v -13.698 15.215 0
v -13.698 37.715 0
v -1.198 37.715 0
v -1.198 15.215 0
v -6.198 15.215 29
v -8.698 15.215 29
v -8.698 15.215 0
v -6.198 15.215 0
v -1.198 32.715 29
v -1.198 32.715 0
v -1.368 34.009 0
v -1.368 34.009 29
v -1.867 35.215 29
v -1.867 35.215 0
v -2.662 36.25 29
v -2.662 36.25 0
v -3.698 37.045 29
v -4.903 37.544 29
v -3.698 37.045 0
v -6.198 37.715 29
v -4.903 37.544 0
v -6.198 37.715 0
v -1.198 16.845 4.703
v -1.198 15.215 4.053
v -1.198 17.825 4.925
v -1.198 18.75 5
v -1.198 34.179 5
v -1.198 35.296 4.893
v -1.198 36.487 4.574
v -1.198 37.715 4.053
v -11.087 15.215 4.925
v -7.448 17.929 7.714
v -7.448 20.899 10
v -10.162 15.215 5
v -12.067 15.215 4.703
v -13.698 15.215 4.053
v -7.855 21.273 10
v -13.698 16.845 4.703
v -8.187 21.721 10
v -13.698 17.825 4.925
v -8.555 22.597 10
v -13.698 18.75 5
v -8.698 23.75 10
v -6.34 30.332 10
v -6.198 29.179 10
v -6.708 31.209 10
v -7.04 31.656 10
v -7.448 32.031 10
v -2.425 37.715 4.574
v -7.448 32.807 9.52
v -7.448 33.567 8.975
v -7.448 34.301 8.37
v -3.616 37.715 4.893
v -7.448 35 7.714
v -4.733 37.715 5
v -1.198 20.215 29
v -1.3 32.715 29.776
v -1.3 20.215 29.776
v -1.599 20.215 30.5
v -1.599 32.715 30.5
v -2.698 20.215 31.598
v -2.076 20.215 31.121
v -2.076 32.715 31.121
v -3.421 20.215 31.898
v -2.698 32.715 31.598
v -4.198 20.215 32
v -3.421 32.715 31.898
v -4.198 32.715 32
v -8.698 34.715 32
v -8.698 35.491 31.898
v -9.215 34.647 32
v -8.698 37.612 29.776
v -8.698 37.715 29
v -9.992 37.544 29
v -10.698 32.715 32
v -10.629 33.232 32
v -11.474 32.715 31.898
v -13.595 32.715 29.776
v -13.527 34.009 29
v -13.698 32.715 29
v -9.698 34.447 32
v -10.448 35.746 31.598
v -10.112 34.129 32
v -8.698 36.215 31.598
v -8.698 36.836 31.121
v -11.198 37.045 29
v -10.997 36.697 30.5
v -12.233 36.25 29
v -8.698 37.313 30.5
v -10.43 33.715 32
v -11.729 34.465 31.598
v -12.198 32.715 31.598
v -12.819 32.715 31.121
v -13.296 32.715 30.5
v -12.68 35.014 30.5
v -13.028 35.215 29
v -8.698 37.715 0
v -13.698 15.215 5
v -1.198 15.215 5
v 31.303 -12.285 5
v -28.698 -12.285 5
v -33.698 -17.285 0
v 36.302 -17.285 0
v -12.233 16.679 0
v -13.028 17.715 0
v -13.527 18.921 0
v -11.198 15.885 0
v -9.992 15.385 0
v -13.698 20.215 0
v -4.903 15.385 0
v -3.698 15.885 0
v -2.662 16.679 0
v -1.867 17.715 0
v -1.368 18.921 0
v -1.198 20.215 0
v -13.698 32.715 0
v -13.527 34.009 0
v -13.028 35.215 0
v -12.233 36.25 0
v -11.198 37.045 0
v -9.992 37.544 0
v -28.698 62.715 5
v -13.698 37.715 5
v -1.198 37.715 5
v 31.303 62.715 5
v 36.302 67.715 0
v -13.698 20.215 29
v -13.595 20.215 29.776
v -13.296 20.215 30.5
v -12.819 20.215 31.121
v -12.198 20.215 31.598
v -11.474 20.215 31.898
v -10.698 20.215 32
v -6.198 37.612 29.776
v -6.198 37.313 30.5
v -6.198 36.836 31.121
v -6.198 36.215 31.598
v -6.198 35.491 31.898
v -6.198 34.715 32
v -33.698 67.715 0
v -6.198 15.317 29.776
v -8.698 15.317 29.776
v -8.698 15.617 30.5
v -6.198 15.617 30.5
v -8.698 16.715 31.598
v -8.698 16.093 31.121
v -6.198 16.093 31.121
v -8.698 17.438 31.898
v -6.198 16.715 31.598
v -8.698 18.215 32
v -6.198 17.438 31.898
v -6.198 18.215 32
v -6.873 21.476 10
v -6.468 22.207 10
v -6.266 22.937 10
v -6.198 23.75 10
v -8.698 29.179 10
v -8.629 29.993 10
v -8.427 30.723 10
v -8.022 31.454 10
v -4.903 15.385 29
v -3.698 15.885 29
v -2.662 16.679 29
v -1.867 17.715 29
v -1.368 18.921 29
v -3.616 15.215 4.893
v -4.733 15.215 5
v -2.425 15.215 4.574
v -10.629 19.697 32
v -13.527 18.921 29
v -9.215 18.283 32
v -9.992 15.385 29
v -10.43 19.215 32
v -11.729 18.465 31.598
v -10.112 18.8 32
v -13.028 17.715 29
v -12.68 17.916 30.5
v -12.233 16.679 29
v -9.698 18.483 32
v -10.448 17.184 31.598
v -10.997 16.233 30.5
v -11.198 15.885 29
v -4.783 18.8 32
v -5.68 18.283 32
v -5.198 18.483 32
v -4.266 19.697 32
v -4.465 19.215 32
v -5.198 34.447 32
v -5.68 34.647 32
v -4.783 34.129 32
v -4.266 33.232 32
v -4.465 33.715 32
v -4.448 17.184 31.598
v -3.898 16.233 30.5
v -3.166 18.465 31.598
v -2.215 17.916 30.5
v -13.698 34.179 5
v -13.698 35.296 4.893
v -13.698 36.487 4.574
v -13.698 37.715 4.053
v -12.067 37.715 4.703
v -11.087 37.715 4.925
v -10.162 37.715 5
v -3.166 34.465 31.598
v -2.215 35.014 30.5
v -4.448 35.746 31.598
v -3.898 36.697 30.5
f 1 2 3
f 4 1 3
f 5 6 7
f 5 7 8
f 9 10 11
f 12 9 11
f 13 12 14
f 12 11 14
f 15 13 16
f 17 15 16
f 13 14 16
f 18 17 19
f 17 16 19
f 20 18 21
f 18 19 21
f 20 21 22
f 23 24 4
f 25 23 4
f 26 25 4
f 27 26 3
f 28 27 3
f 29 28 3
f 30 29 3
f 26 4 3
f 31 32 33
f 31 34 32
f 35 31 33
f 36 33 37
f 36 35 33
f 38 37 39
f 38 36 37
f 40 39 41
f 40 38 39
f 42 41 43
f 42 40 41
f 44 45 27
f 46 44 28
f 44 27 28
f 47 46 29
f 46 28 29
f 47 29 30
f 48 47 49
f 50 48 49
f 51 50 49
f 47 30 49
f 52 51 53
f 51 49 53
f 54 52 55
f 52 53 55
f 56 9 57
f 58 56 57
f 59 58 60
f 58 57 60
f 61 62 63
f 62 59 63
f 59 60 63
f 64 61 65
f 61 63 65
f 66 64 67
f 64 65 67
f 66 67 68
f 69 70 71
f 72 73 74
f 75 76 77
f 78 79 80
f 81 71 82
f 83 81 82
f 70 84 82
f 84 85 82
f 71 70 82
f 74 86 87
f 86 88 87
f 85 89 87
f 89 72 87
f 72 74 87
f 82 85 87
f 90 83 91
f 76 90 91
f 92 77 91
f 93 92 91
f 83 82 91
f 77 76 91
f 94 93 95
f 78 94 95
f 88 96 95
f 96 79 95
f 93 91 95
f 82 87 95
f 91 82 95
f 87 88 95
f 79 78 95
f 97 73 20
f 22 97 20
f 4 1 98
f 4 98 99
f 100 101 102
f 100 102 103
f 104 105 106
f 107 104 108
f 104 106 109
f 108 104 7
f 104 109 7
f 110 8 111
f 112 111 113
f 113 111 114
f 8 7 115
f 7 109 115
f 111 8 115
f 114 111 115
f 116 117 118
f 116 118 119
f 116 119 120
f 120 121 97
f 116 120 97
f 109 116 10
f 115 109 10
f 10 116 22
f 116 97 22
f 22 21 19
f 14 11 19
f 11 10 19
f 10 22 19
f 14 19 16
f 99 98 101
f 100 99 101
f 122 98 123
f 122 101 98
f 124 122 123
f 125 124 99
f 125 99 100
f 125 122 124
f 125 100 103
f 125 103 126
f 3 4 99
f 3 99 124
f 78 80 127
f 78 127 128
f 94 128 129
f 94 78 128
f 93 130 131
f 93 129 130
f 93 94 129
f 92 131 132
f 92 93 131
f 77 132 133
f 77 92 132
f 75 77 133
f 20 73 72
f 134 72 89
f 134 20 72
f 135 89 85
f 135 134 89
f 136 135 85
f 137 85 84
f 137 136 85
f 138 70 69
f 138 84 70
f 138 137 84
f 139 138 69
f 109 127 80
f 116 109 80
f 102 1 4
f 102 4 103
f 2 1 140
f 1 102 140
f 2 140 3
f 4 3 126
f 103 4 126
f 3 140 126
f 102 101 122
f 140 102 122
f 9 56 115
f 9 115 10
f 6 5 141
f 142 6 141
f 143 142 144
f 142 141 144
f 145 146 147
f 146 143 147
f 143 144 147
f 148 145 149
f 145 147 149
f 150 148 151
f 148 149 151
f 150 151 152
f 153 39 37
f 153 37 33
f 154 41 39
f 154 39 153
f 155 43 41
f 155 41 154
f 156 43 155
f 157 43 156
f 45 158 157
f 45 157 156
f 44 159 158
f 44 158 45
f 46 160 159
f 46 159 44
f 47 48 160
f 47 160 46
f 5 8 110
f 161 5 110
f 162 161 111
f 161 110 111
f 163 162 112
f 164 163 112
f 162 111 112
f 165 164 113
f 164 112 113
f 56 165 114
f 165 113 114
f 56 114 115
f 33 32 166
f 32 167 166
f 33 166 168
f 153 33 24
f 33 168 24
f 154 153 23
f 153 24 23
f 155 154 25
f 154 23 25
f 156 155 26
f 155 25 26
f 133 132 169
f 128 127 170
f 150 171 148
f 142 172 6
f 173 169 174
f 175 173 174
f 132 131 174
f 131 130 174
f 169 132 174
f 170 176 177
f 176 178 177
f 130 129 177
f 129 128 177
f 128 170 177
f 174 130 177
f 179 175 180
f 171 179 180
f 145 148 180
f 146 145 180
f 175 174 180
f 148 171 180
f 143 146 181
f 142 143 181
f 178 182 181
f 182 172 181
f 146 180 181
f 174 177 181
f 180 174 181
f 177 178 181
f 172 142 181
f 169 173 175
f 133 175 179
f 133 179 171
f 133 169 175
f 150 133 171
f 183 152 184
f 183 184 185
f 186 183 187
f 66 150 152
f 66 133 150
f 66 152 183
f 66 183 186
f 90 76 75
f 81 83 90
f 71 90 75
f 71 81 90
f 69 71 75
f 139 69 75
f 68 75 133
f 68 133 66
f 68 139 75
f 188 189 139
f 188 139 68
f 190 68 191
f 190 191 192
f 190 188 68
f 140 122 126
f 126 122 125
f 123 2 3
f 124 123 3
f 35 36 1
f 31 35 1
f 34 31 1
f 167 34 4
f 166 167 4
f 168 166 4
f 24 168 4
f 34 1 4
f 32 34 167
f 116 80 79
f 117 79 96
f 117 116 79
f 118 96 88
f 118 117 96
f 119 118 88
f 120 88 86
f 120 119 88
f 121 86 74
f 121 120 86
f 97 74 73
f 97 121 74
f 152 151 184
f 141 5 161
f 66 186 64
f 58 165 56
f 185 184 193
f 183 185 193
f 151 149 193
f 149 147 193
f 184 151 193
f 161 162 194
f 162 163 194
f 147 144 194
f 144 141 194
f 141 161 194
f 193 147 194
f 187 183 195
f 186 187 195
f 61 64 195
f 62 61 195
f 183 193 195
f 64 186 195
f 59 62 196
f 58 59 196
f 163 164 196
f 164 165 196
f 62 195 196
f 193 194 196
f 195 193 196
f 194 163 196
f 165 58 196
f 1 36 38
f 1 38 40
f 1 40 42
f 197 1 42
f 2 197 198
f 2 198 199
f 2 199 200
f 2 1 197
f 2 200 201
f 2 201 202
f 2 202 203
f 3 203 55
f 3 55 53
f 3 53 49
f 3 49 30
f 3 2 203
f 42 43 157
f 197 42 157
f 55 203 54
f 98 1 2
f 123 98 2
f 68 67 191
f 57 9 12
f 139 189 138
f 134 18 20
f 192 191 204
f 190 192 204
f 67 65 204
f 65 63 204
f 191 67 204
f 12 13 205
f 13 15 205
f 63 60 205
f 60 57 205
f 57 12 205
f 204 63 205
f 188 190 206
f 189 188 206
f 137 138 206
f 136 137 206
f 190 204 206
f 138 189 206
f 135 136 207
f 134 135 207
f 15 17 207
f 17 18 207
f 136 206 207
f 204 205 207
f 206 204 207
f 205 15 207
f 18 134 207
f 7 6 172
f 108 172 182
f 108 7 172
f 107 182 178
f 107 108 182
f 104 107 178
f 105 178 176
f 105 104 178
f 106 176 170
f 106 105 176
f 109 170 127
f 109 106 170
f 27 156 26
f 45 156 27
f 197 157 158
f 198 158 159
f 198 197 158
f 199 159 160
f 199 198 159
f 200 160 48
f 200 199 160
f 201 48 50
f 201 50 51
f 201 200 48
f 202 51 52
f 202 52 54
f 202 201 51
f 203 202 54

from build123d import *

# Parameters (mm, degrees)
F0_W         = 70
F0_H         = 85
F0_W_2       = 12.5
F0_H_2       = 22.5
F1_DEPTH     = 5
F2_SIZE      = 4.99999
F3_DEPTH     = 32
F4_R         = 3
F5_T1_DEPTH  = 44.5
F5_T4_ANGLE  = 90
F5_T6_ANGLE  = 90
F5_T8_ANGLE  = 90
F5_T10_ANGLE = 90
F6_DEPTH     = 10
F7_SIZE      = 5
F8_T1_DEPTH  = 23.0940107676
F8_T3_DEPTH  = 23.0940107676
F8_T5_DEPTH  = 23.0940107676
F8_T7_DEPTH  = 23.0940107676


# Not quite as in the source:
# - a fillet or chamfer that OpenCascade refuses, or shapes differently, is made with other operations: its cross-section is extruded or revolved along the edge and cut away or added
# - a fillet or chamfer is up to 0.001 mm smaller than in the source, because OpenCascade refuses the exact size


with BuildPart() as f1:
    # F0 (on Top) → F1 (new body)
    with BuildSketch(Plane.XY):
        with Locations((1.3024921715, 25.2146533675)):
            Rectangle(F0_W, F0_H)
        with Locations((-7.4475078285, 26.4646533675)):
            Rectangle(F0_W_2, F0_H_2, mode=Mode.SUBTRACT)
    extrude(amount=F1_DEPTH)

    # F2 (size 5 in the source; OpenCascade refuses exactly that, so slightly less here)
    f2_edges = [f1.edges().sort_by_distance(p)[0] for p in [
        (-33.697508, 25.214653, 5),
        (1.302492, -17.285347, 5),
        (36.302492, 25.214653, 5),
        (1.302492, 67.714653, 5),
    ]]
    chamfer(f2_edges, length=F2_SIZE)


with BuildPart() as f3:
    # F0 (on Top) → F3 (new body)
    with BuildSketch(Plane.XY):
        with Locations((-7.4475078285, 26.4646533675)):
            Rectangle(F0_W_2, F0_H_2)
    extrude(amount=F3_DEPTH)

    # F4
    f4_edges = [f3.edges().sort_by_distance(p)[0] for p in [
        (-13.697508, 26.464653, 32),
        (-7.447508, 15.214653, 32),
        (-7.447508, 37.714653, 32),
        (-1.197508, 26.464653, 32),
    ]]
    fillet(f4_edges, radius=F4_R)

    # F5: fillet of radius 5 on 8 edges, made by hand

    # F5_s2 → F5_t1 (cut)
    with BuildSketch(Plane.XY.offset(-12.5)):
        with BuildLine():
            ThreePointArc((-1.1975078285, 32.7146533675), (-2.6619739225, 36.2501872734), (-6.1975078285, 37.7146533675))
            Line((-6.1975078285, 37.7146533675), (-1.1975078285, 37.7146533675))
            Line((-1.1975078285, 37.7146533675), (-1.1975078285, 32.7146533675))
        make_face()
        with BuildLine():
            ThreePointArc((-6.1975078285, 15.2146533675), (-2.6619739225, 16.6791194616), (-1.1975078285, 20.2146533675))
            Line((-1.1975078285, 20.2146533675), (-1.1975078285, 15.2146533675))
            Line((-1.1975078285, 15.2146533675), (-6.1975078285, 15.2146533675))
        make_face()
        with BuildLine():
            ThreePointArc((-8.6975078285, 15.2146533675), (-12.2330417344, 16.6791194616), (-13.6975078285, 20.2146533675))
            Line((-13.6975078285, 20.2146533675), (-13.6975078285, 15.2146533675))
            Line((-13.6975078285, 15.2146533675), (-8.6975078285, 15.2146533675))
        make_face()
        with BuildLine():
            ThreePointArc((-13.6975078285, 32.7146533675), (-12.2330417344, 36.2501872734), (-8.6975078285, 37.7146533675))
            Line((-8.6975078285, 37.7146533675), (-13.6975078285, 37.7146533675))
            Line((-13.6975078285, 37.7146533675), (-13.6975078285, 32.7146533675))
        make_face()
    extrude(amount=F5_T1_DEPTH, mode=Mode.SUBTRACT)

    # F5_s3 → F5_t4 (revolve, cut)
    with BuildSketch(Plane.YZ.offset(-8.6975078285)):
        with BuildLine():
            ThreePointArc((34.7146533675, 32), (36.8359737111, 31.1213203436), (37.7146533675, 29))
            Line((37.7146533675, 29), (37.7146533675, 32))
            Line((37.7146533675, 32), (34.7146533675, 32))
        make_face()
    revolve(axis=Axis((-8.6975078285, 32.7146533675, 32), (0, 0, 1)), revolution_arc=F5_T4_ANGLE, mode=Mode.SUBTRACT)

    # F5_s5 → F5_t6 (revolve, cut)
    with BuildSketch(Plane.XZ.offset(-20.2146533675)):
        with BuildLine():
            ThreePointArc((-10.6975078285, 32), (-12.818828172, 31.1213203436), (-13.6975078285, 29))
            Line((-13.6975078285, 29), (-13.6975078285, 32))
            Line((-13.6975078285, 32), (-10.6975078285, 32))
        make_face()
    revolve(axis=Axis((-8.6975078285, 20.2146533675, 32), (0, 0, 1)), revolution_arc=F5_T6_ANGLE, mode=Mode.SUBTRACT)

    # F5_s7 → F5_t8 (revolve, cut)
    with BuildSketch(Plane.YZ.offset(-6.1975078285)):
        with BuildLine():
            ThreePointArc((18.2146533675, 32), (16.0933330239, 31.1213203436), (15.2146533675, 29))
            Line((15.2146533675, 29), (15.2146533675, 32))
            Line((15.2146533675, 32), (18.2146533675, 32))
        make_face()
    revolve(axis=Axis((-6.1975078285, 20.2146533675, 32), (0, 0, 1)), revolution_arc=F5_T8_ANGLE, mode=Mode.SUBTRACT)

    # F5_s9 → F5_t10 (revolve, cut)
    with BuildSketch(Plane.XZ.offset(-32.7146533675)):
        with BuildLine():
            ThreePointArc((-4.1975078285, 32), (-2.0761874849, 31.1213203436), (-1.1975078285, 29))
            Line((-1.1975078285, 29), (-1.1975078285, 32))
            Line((-1.1975078285, 32), (-4.1975078285, 32))
        make_face()
    revolve(axis=Axis((-6.1975078285, 32.7146533675, 32), (0, 0, 1)), revolution_arc=F5_T10_ANGLE, mode=Mode.SUBTRACT)


with BuildPart() as f6:
    # F0 (on Top) → F6 (new body)
    with BuildSketch(Plane.XY):
        with Locations((-7.4475078285, 26.4646533675)):
            Rectangle(F0_W_2, F0_H_2)
    extrude(amount=F6_DEPTH)

    # F7
    f7_edges = [f6.edges().sort_by_distance(p)[0] for p in [
        (-13.697508, 26.464653, 10),
        (-7.447508, 15.214653, 10),
        (-1.197508, 26.464653, 10),
        (-7.447508, 37.714653, 10),
    ]]
    chamfer(f7_edges, length=F7_SIZE)

    # F8: fillet of radius 5 on 4 edges, made by hand

    # F8_s2 → F8_t1 (cut)
    with BuildSketch(Plane(origin=(-19.6373870653, 19.6373870653, -19.6373870653), x_dir=(0.7071067812, 0.7071067812, 0), z_dir=(0.5773502692, -0.5773502692, 0.5773502692))):
        with BuildLine():
            ThreePointArc((14.4826864754, 23.628034149), (16.9826864754, 24.2979071301), (19.4826864754, 23.628034149))
            Line((19.4826864754, 23.628034149), (16.9826864754, 25.0714098219))
            Line((16.9826864754, 25.0714098219), (14.4826864754, 23.628034149))
        make_face()
    extrude(amount=F8_T1_DEPTH, mode=Mode.SUBTRACT)

    # F8_s4 → F8_t3 (cut)
    with BuildSketch(Plane(origin=(14.6723818463, 14.6723818463, -14.6723818463), x_dir=(0.7071067812, -0.7071067812, 0), z_dir=(-0.5773502692, -0.5773502692, 0.5773502692))):
        with BuildLine():
            ThreePointArc((-25.0150530523, 17.5471694706), (-27.5150530523, 18.2170424517), (-30.0150530523, 17.5471694706))
            Line((-30.0150530523, 17.5471694706), (-27.5150530523, 18.9905451436))
            Line((-27.5150530523, 18.9905451436), (-25.0150530523, 17.5471694706))
        make_face()
    extrude(amount=F8_T3_DEPTH, mode=Mode.SUBTRACT)

    # F8_s6 → F8_t5 (cut)
    with BuildSketch(Plane(origin=(-1.9942848203, -1.9942848203, -1.9942848203), x_dir=(-0.7071067812, 0.7071067812, 0), z_dir=(0.5773502692, 0.5773502692, 0.5773502692))):
        with BuildLine():
            ThreePointArc((17.9439852404, 2.019735159), (20.4439852404, 2.68960814), (22.9439852404, 2.019735159))
            Line((22.9439852404, 2.019735159), (20.4439852404, 3.4631108319))
            Line((20.4439852404, 3.4631108319), (17.9439852404, 2.019735159))
        make_face()
    extrude(amount=F8_T5_DEPTH, mode=Mode.SUBTRACT)

    # F8_s8 → F8_t7 (cut)
    with BuildSketch(Plane(origin=(-2.9707203987, 2.9707203987, 2.9707203987), x_dir=(-0.7071067812, -0.7071067812, 0), z_dir=(-0.5773502692, 0.5773502692, 0.5773502692))):
        with BuildLine():
            ThreePointArc((-7.4116186635, -4.0611295194), (-9.9116186635, -3.3912565383), (-12.4116186635, -4.0611295194))
            Line((-12.4116186635, -4.0611295194), (-9.9116186635, -2.6177538464))
            Line((-9.9116186635, -2.6177538464), (-7.4116186635, -4.0611295194))
        make_face()
    extrude(amount=F8_T7_DEPTH, mode=Mode.SUBTRACT)


solid = Compound([f1.part, f3.part, f6.part])
